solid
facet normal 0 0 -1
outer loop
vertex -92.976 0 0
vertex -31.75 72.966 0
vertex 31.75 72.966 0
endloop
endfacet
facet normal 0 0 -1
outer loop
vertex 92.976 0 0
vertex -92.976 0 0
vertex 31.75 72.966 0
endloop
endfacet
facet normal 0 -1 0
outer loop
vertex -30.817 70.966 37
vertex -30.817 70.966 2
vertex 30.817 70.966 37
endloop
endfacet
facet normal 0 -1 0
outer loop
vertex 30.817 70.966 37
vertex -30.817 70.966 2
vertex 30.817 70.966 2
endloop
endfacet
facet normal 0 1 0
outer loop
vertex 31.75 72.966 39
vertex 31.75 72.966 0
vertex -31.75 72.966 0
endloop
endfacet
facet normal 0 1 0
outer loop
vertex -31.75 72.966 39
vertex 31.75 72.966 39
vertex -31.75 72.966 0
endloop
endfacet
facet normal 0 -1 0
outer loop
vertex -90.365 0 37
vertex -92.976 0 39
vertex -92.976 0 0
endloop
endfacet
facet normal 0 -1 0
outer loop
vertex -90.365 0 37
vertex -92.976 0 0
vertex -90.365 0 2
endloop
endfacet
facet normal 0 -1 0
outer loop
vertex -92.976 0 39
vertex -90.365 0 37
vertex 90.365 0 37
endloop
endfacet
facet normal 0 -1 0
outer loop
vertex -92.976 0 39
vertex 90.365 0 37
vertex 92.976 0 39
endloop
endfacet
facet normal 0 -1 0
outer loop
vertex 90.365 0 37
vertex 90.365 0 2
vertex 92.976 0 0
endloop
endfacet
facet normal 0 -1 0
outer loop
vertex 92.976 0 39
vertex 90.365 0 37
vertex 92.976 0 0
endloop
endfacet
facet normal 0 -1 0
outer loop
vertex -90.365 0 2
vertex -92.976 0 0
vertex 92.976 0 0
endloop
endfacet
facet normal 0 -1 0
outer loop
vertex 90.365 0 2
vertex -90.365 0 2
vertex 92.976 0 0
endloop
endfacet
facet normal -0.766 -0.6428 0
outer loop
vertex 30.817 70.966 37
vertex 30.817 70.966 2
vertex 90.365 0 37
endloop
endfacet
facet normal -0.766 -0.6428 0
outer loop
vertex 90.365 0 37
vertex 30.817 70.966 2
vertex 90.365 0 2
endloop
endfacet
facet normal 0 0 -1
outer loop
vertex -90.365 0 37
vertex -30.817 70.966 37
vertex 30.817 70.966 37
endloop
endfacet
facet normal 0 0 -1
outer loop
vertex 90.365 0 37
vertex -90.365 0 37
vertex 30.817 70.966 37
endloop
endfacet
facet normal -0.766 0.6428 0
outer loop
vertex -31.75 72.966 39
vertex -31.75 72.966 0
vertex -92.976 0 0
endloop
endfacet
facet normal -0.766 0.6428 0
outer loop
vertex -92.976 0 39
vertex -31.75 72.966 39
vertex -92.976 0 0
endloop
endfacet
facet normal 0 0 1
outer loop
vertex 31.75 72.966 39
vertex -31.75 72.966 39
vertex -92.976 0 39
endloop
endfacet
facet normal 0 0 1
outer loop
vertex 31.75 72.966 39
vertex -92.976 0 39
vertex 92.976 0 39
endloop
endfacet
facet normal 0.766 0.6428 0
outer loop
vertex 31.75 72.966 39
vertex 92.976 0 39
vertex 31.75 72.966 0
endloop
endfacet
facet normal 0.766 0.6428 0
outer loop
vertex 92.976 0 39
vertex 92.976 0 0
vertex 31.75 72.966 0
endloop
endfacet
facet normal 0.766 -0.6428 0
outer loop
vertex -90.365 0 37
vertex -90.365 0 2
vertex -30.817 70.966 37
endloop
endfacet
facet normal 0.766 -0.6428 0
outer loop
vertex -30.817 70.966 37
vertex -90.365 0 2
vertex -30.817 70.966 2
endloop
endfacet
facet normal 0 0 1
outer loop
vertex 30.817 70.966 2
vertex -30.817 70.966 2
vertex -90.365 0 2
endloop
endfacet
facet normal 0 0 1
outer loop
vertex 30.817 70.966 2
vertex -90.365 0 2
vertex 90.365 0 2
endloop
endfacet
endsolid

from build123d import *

# Parameters (mm, degrees)
F1_DEPTH = 2
F3_DEPTH = 35
F5_DEPTH = 2


# Not quite as in the source:
# - a feature names something its author has since deleted; it is built from what else it names


with BuildPart() as f1:
    # F0 (on Top) → F1 (new body)
    with BuildSketch(Plane.XY):
        Polygon((-31.75, 72.9657332071), (-92.9755198226, 0), (92.9755198226, 0), (31.75, 72.9657332071), align=None)
    extrude(amount=F1_DEPTH)

    # F2 (on face) → F3 (join)
    with BuildSketch(Plane.XY.offset(2)):
        Polygon((30.8173846837, 70.9657332071), (90.364705244, 0), (92.9755198226, 0), (31.75, 72.9657332071), (-31.75, 72.9657332071), (-92.9755198226, 0), (-90.364705244, 0), (-30.8173846837, 70.9657332071), align=None)
    extrude(amount=F3_DEPTH)

    # F4 (on face) → F5 (join)
    with BuildSketch(Plane.XY.offset(37)):
        Polygon((-31.75, 72.9657332071), (-92.9755198226, 0), (92.9755198226, 0), (31.75, 72.9657332071), align=None)
    extrude(amount=F5_DEPTH)


solid = f1.part
